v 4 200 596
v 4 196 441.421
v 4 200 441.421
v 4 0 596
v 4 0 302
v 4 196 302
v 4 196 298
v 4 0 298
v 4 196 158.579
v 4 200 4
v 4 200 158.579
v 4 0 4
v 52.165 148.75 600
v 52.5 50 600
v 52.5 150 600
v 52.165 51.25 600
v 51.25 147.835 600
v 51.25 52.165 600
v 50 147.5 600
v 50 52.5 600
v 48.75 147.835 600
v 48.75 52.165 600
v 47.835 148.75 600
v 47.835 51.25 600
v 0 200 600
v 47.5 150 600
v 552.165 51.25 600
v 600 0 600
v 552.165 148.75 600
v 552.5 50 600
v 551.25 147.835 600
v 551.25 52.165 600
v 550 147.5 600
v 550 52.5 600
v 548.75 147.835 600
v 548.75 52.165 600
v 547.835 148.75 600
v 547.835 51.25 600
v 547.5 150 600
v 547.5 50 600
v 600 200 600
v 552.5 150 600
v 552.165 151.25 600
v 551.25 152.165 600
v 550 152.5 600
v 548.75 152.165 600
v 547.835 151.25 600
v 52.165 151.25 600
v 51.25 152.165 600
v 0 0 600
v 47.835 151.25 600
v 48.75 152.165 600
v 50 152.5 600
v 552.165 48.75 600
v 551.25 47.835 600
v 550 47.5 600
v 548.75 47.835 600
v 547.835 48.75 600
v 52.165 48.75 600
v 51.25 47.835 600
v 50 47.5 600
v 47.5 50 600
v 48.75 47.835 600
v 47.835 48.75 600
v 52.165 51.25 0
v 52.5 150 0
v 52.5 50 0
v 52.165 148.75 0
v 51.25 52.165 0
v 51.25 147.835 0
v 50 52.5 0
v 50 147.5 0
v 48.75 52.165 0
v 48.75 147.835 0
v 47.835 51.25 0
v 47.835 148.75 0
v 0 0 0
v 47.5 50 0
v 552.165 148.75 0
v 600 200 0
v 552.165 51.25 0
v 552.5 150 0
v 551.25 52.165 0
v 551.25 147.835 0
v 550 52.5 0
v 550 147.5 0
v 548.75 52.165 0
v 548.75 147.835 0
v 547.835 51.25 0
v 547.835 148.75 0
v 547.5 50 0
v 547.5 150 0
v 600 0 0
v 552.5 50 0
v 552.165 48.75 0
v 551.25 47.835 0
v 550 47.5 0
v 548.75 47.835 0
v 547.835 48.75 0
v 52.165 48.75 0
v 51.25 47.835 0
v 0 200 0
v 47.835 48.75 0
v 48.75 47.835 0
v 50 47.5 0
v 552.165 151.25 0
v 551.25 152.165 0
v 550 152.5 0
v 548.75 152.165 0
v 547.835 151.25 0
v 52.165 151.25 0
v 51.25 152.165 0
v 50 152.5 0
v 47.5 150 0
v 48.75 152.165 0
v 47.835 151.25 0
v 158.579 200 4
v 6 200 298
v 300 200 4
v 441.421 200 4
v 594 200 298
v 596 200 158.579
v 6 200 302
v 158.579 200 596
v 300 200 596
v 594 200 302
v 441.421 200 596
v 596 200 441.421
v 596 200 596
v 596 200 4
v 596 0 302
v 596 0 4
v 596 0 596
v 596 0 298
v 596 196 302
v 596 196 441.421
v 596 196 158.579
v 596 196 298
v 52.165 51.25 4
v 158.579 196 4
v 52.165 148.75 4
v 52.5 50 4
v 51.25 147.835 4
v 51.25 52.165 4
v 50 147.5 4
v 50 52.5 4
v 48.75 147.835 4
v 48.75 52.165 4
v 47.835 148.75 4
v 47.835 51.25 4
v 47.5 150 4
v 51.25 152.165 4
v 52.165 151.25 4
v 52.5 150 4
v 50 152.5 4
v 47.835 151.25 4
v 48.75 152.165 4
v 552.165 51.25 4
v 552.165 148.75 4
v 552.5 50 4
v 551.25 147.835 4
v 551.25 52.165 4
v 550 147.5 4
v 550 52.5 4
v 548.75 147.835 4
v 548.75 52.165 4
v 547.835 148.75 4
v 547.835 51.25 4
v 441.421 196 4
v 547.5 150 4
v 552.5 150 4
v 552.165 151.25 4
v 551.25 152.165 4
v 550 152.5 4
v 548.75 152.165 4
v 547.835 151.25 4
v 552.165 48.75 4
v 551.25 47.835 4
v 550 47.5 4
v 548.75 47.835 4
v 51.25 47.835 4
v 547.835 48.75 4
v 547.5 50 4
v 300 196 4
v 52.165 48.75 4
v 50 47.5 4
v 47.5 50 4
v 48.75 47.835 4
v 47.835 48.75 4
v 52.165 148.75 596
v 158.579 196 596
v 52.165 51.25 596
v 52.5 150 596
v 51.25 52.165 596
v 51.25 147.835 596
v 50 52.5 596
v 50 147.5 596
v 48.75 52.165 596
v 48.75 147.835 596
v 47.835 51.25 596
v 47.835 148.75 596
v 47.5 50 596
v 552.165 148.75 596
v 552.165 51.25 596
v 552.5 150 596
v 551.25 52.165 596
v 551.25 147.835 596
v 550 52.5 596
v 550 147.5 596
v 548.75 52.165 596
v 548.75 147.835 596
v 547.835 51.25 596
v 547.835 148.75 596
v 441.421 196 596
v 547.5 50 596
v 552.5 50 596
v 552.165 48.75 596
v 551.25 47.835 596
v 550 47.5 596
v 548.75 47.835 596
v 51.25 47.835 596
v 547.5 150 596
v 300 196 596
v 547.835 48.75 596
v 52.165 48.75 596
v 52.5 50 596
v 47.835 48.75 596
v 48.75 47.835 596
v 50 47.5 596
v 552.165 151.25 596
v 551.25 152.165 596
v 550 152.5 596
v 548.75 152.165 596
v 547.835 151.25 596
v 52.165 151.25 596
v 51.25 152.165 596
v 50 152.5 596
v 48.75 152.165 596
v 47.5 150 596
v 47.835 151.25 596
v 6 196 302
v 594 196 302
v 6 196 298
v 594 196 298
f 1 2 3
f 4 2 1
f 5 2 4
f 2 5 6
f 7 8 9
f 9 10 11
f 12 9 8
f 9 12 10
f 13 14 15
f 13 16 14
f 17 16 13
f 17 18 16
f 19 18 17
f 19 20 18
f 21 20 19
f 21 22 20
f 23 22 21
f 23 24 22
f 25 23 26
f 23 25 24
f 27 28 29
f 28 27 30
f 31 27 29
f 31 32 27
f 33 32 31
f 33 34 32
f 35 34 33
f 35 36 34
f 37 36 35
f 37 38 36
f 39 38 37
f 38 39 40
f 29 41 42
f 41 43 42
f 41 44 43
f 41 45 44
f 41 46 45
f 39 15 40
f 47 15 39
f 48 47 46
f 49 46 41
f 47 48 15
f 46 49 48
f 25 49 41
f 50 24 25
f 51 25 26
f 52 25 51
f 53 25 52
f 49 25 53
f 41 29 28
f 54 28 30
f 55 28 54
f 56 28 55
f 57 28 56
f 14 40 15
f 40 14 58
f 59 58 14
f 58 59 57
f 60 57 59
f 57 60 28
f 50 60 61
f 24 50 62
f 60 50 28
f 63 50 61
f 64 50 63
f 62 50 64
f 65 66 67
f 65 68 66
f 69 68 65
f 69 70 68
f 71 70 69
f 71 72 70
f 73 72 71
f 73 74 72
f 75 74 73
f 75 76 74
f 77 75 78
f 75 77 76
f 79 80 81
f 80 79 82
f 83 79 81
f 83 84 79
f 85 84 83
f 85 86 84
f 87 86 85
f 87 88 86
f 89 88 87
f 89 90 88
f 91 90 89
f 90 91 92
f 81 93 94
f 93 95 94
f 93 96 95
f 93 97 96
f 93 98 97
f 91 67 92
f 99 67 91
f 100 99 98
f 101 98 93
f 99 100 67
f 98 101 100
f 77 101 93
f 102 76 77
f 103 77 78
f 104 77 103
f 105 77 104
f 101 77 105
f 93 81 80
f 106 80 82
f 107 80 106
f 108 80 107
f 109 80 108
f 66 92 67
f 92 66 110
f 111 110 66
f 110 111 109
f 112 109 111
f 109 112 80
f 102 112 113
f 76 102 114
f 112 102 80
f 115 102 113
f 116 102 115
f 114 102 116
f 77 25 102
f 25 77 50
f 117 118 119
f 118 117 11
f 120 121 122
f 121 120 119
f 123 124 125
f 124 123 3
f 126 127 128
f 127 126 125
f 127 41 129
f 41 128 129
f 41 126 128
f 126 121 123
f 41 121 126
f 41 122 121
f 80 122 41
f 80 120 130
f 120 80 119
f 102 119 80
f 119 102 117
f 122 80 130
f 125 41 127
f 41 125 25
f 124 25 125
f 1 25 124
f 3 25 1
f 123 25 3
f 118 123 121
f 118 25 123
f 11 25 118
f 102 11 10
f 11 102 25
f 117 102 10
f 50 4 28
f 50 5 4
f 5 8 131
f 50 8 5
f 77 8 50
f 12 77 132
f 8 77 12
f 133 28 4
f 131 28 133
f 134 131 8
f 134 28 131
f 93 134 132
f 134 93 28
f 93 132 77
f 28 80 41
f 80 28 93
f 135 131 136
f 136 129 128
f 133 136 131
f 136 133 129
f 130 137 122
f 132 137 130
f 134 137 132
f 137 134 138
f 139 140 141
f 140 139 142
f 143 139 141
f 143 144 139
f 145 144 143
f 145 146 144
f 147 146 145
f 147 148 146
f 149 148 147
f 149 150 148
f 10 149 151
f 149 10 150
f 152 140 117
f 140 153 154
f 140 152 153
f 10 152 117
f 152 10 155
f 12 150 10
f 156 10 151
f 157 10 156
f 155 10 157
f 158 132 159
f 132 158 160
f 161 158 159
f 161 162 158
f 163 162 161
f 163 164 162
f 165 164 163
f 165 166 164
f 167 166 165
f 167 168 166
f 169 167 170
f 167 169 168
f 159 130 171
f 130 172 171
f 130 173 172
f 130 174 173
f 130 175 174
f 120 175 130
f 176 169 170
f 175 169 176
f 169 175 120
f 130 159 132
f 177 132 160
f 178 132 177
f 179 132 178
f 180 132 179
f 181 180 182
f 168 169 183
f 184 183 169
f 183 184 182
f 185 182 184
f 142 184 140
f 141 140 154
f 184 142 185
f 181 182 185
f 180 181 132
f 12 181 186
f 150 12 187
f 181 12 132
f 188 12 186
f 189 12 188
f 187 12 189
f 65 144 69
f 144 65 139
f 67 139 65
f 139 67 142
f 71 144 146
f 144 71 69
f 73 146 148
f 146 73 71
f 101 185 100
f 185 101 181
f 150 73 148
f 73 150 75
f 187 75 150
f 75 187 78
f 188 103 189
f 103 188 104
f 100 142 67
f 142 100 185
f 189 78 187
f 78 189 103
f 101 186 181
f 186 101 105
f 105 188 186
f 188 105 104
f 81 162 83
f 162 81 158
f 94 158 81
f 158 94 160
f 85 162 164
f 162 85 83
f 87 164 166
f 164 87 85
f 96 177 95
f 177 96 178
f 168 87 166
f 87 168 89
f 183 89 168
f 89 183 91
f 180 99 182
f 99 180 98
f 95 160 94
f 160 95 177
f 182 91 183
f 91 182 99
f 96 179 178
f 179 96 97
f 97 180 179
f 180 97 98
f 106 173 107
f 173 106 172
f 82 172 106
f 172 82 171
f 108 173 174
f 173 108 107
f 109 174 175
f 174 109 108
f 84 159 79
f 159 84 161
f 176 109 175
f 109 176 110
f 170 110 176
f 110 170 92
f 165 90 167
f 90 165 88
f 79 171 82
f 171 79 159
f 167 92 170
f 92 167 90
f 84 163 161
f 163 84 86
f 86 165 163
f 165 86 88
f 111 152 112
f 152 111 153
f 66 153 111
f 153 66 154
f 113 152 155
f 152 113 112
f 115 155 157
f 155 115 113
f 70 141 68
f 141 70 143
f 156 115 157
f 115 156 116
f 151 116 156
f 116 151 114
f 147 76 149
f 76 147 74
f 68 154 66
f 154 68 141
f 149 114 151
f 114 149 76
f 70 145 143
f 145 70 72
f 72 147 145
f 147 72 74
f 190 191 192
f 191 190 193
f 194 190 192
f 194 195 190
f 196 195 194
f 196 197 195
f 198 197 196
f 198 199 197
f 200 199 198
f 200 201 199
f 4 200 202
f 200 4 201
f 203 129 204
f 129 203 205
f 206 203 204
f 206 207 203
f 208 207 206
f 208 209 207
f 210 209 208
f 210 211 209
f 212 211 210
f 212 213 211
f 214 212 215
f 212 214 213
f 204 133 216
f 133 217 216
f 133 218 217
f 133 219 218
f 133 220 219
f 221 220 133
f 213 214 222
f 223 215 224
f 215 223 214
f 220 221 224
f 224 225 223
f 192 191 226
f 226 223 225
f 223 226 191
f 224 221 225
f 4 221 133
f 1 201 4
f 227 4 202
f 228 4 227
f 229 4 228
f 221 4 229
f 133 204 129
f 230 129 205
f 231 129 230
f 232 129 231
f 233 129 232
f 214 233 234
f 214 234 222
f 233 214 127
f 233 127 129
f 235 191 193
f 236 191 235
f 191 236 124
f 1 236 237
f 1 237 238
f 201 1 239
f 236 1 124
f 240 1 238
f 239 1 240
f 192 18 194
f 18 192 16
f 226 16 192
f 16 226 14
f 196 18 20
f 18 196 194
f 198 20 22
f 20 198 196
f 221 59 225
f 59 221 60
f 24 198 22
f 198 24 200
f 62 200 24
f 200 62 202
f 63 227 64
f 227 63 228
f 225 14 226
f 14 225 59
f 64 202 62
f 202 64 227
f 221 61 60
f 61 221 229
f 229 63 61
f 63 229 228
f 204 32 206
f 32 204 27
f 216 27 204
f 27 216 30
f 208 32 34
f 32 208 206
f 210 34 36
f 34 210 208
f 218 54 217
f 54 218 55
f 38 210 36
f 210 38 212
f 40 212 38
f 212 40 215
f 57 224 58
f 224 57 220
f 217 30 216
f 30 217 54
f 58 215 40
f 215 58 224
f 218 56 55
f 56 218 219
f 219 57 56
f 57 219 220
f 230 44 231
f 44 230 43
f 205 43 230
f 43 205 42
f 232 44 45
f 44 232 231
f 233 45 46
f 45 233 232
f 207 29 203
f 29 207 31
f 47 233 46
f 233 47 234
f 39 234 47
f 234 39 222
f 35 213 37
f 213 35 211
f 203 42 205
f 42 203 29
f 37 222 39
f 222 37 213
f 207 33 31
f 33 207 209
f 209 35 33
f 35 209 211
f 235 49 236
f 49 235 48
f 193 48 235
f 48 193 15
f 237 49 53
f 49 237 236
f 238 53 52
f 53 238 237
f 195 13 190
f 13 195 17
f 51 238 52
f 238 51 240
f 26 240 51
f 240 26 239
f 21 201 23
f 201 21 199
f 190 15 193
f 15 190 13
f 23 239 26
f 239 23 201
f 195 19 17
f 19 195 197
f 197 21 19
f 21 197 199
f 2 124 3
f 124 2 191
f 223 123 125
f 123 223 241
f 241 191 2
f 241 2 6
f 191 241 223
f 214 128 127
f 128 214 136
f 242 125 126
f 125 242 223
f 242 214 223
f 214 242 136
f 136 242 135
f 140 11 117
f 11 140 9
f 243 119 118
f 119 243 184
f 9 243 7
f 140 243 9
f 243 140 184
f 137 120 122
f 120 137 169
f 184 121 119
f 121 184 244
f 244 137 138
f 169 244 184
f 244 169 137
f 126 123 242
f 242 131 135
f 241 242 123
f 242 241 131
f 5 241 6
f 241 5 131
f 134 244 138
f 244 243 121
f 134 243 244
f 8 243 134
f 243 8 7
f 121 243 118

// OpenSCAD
// Generated by SolidPython 0.4.2 on 2019-10-26 15:41:52
$fn = 12;

union() {
	union() {
		union() {
			cube(size = [4, 200, 600]);
			translate(v = [596, 0, 0]) {
				cube(size = [4, 200, 600]);
			}
		}
		translate(v = [0, 0, 298.0000000000]) {
			translate(v = [4, 0, 0]) {
				cube(size = [592, 200, 4]);
			}
		}
		union() {
			translate(v = [0, 0, 596]) {
				difference() {
					translate(v = [4, 0, 0]) {
						cube(size = [592, 200, 4]);
					}
					translate(v = [50, 50, 0]) {
						cylinder(h = 14, r = 2.5000000000);
					}
					translate(v = [550, 50, 0]) {
						cylinder(h = 14, r = 2.5000000000);
					}
					translate(v = [550, 150, 0]) {
						cylinder(h = 14, r = 2.5000000000);
					}
					translate(v = [50, 150, 0]) {
						cylinder(h = 14, r = 2.5000000000);
					}
				}
			}
			difference() {
				translate(v = [4, 0, 0]) {
					cube(size = [592, 200, 4]);
				}
				translate(v = [50, 50, 0]) {
					cylinder(h = 14, r = 2.5000000000);
				}
				translate(v = [550, 50, 0]) {
					cylinder(h = 14, r = 2.5000000000);
				}
				translate(v = [550, 150, 0]) {
					cylinder(h = 14, r = 2.5000000000);
				}
				translate(v = [50, 150, 0]) {
					cylinder(h = 14, r = 2.5000000000);
				}
			}
		}
		difference() {
			translate(v = [0, 0, 300.0000000000]) {
				translate(v = [0, 196, 0]) {
					union() {
						translate(v = [4, 0, 0]) {
							difference() {
								rotate(a = [0, -45, 0]) {
									cube(size = [450.0000000000, 4, 100]);
								}
								translate(v = [0, -100.0000000000, 0]) {
									difference() {
										translate(v = [0, 0, -150.0000000000]) {
											translate(v = [-150.0000000000, 0, 0]) {
												cube(size = [600, 200, 600]);
											}
										}
										translate(v = [0, -5, 0]) {
											cube(size = [296.0000000000, 210, 296.0000000000]);
										}
									}
								}
							}
						}
						translate(v = [600, 0, 0]) {
							mirror(v = [1, 0, 0]) {
								translate(v = [4, 0, 0]) {
									difference() {
										rotate(a = [0, -45, 0]) {
											cube(size = [450.0000000000, 4, 100]);
										}
										translate(v = [0, -100.0000000000, 0]) {
											difference() {
												translate(v = [0, 0, -150.0000000000]) {
													translate(v = [-150.0000000000, 0, 0]) {
														cube(size = [600, 200, 600]);
													}
												}
												translate(v = [0, -5, 0]) {
													cube(size = [296.0000000000, 210, 296.0000000000]);
												}
											}
										}
									}
								}
							}
						}
						mirror(v = [0, 0, 1]) {
							union() {
								translate(v = [4, 0, 0]) {
									difference() {
										rotate(a = [0, -45, 0]) {
											cube(size = [450.0000000000, 4, 100]);
										}
										translate(v = [0, -100.0000000000, 0]) {
											difference() {
												translate(v = [0, 0, -150.0000000000]) {
													translate(v = [-150.0000000000, 0, 0]) {
														cube(size = [600, 200, 600]);
													}
												}
												translate(v = [0, -5, 0]) {
													cube(size = [296.0000000000, 210, 296.0000000000]);
												}
											}
										}
									}
								}
								translate(v = [600, 0, 0]) {
									mirror(v = [1, 0, 0]) {
										translate(v = [4, 0, 0]) {
											difference() {
												rotate(a = [0, -45, 0]) {
													cube(size = [450.0000000000, 4, 100]);
												}
												translate(v = [0, -100.0000000000, 0]) {
													difference() {
														translate(v = [0, 0, -150.0000000000]) {
															translate(v = [-150.0000000000, 0, 0]) {
																cube(size = [600, 200, 600]);
															}
														}
														translate(v = [0, -5, 0]) {
															cube(size = [296.0000000000, 210, 296.0000000000]);
														}
													}
												}
											}
										}
									}
								}
							}
						}
					}
				}
			}
			translate(v = [0, 0, 298.0000000000]) {
				translate(v = [4, 0, 0]) {
					cube(size = [592, 200, 4]);
				}
			}
		}
	}
}
/***********************************************
*********      SolidPython code:      **********
************************************************
 
import solid as sp
import solid.utils as spu

thickness = 4
holes = 5

SEGMENTS = 12


def box(width, height, depth, half=False, topbox=False):
    obj = sp.part()
    left = sp.cube([thickness, depth, height])
    right = left.copy()
    right = spu.right(width-thickness)(right)
    obj += left + right

    top = sp.cube([width-2*thickness, depth, thickness])
    top = spu.right(thickness)(top)
    if (half):
        ha = spu.up(height/2-thickness/2)(top)
        obj += ha
    h = sp.cylinder(holes/2, thickness+10)
    top -= sp.translate([50, 50, 0])(h)
    top -= sp.translate([width-50, 50, 0])(h)
    top -= sp.translate([width-50, depth-50, 0])(h)
    top -= sp.translate([50, depth-50, 0])(h)
    bottom = top
    top = spu.up(height-thickness)(top)
    obj += top + bottom

    if(not topbox):
        sta = sp.cube([width*3/4, thickness, 100])
        sta = sp.rotate([0, -45, 0])(sta)
        cutout = sp.cube([width, depth, height])
        cutout = spu.down(height/4)(spu.left(width/4)(cutout))
        cutout -= spu.back(5)(sp.cube([width/2-thickness, depth+10, height/2-thickness]))
        sta -= spu.back(depth/2)(cutout)
        sta = spu.right(thickness)(sta)
        sta += spu.right(width)(sp.mirror([1, 0, 0])(sta))
        sta += sp.mirror([0, 0, 1])(sta)
        sta = spu.forward(depth-thickness)(sta)
        obj += (spu.up(height/2)(sta) - ha)

    if(half and topbox):
        window = sp.cube([width-2*thickness, thickness,
                          height/2-1.5*thickness])
        window = sp.translate([thickness, 0, thickness])(window)
        obj += spu.up(height/2-thickness/2)(window)
    return obj


def main():
    obj = sp.part()
    obj += box(600, 600, 200, True, False)
    return obj


if __name__ == "__main__":
    import os
    import sys
    out_dir = sys.argv[1] if len(sys.argv) > 1 else os.curdir
    file_out = os.path.join(out_dir, 'box.scad')

    obj = main()

    print("%(__file__)s: SCAD file written to: \n%(file_out)s" % vars())
    sp.scad_render_to_file(obj, file_out, file_header='$fn = %s;' % SEGMENTS,
                           include_orig_code=True)
 
 
************************************************/
